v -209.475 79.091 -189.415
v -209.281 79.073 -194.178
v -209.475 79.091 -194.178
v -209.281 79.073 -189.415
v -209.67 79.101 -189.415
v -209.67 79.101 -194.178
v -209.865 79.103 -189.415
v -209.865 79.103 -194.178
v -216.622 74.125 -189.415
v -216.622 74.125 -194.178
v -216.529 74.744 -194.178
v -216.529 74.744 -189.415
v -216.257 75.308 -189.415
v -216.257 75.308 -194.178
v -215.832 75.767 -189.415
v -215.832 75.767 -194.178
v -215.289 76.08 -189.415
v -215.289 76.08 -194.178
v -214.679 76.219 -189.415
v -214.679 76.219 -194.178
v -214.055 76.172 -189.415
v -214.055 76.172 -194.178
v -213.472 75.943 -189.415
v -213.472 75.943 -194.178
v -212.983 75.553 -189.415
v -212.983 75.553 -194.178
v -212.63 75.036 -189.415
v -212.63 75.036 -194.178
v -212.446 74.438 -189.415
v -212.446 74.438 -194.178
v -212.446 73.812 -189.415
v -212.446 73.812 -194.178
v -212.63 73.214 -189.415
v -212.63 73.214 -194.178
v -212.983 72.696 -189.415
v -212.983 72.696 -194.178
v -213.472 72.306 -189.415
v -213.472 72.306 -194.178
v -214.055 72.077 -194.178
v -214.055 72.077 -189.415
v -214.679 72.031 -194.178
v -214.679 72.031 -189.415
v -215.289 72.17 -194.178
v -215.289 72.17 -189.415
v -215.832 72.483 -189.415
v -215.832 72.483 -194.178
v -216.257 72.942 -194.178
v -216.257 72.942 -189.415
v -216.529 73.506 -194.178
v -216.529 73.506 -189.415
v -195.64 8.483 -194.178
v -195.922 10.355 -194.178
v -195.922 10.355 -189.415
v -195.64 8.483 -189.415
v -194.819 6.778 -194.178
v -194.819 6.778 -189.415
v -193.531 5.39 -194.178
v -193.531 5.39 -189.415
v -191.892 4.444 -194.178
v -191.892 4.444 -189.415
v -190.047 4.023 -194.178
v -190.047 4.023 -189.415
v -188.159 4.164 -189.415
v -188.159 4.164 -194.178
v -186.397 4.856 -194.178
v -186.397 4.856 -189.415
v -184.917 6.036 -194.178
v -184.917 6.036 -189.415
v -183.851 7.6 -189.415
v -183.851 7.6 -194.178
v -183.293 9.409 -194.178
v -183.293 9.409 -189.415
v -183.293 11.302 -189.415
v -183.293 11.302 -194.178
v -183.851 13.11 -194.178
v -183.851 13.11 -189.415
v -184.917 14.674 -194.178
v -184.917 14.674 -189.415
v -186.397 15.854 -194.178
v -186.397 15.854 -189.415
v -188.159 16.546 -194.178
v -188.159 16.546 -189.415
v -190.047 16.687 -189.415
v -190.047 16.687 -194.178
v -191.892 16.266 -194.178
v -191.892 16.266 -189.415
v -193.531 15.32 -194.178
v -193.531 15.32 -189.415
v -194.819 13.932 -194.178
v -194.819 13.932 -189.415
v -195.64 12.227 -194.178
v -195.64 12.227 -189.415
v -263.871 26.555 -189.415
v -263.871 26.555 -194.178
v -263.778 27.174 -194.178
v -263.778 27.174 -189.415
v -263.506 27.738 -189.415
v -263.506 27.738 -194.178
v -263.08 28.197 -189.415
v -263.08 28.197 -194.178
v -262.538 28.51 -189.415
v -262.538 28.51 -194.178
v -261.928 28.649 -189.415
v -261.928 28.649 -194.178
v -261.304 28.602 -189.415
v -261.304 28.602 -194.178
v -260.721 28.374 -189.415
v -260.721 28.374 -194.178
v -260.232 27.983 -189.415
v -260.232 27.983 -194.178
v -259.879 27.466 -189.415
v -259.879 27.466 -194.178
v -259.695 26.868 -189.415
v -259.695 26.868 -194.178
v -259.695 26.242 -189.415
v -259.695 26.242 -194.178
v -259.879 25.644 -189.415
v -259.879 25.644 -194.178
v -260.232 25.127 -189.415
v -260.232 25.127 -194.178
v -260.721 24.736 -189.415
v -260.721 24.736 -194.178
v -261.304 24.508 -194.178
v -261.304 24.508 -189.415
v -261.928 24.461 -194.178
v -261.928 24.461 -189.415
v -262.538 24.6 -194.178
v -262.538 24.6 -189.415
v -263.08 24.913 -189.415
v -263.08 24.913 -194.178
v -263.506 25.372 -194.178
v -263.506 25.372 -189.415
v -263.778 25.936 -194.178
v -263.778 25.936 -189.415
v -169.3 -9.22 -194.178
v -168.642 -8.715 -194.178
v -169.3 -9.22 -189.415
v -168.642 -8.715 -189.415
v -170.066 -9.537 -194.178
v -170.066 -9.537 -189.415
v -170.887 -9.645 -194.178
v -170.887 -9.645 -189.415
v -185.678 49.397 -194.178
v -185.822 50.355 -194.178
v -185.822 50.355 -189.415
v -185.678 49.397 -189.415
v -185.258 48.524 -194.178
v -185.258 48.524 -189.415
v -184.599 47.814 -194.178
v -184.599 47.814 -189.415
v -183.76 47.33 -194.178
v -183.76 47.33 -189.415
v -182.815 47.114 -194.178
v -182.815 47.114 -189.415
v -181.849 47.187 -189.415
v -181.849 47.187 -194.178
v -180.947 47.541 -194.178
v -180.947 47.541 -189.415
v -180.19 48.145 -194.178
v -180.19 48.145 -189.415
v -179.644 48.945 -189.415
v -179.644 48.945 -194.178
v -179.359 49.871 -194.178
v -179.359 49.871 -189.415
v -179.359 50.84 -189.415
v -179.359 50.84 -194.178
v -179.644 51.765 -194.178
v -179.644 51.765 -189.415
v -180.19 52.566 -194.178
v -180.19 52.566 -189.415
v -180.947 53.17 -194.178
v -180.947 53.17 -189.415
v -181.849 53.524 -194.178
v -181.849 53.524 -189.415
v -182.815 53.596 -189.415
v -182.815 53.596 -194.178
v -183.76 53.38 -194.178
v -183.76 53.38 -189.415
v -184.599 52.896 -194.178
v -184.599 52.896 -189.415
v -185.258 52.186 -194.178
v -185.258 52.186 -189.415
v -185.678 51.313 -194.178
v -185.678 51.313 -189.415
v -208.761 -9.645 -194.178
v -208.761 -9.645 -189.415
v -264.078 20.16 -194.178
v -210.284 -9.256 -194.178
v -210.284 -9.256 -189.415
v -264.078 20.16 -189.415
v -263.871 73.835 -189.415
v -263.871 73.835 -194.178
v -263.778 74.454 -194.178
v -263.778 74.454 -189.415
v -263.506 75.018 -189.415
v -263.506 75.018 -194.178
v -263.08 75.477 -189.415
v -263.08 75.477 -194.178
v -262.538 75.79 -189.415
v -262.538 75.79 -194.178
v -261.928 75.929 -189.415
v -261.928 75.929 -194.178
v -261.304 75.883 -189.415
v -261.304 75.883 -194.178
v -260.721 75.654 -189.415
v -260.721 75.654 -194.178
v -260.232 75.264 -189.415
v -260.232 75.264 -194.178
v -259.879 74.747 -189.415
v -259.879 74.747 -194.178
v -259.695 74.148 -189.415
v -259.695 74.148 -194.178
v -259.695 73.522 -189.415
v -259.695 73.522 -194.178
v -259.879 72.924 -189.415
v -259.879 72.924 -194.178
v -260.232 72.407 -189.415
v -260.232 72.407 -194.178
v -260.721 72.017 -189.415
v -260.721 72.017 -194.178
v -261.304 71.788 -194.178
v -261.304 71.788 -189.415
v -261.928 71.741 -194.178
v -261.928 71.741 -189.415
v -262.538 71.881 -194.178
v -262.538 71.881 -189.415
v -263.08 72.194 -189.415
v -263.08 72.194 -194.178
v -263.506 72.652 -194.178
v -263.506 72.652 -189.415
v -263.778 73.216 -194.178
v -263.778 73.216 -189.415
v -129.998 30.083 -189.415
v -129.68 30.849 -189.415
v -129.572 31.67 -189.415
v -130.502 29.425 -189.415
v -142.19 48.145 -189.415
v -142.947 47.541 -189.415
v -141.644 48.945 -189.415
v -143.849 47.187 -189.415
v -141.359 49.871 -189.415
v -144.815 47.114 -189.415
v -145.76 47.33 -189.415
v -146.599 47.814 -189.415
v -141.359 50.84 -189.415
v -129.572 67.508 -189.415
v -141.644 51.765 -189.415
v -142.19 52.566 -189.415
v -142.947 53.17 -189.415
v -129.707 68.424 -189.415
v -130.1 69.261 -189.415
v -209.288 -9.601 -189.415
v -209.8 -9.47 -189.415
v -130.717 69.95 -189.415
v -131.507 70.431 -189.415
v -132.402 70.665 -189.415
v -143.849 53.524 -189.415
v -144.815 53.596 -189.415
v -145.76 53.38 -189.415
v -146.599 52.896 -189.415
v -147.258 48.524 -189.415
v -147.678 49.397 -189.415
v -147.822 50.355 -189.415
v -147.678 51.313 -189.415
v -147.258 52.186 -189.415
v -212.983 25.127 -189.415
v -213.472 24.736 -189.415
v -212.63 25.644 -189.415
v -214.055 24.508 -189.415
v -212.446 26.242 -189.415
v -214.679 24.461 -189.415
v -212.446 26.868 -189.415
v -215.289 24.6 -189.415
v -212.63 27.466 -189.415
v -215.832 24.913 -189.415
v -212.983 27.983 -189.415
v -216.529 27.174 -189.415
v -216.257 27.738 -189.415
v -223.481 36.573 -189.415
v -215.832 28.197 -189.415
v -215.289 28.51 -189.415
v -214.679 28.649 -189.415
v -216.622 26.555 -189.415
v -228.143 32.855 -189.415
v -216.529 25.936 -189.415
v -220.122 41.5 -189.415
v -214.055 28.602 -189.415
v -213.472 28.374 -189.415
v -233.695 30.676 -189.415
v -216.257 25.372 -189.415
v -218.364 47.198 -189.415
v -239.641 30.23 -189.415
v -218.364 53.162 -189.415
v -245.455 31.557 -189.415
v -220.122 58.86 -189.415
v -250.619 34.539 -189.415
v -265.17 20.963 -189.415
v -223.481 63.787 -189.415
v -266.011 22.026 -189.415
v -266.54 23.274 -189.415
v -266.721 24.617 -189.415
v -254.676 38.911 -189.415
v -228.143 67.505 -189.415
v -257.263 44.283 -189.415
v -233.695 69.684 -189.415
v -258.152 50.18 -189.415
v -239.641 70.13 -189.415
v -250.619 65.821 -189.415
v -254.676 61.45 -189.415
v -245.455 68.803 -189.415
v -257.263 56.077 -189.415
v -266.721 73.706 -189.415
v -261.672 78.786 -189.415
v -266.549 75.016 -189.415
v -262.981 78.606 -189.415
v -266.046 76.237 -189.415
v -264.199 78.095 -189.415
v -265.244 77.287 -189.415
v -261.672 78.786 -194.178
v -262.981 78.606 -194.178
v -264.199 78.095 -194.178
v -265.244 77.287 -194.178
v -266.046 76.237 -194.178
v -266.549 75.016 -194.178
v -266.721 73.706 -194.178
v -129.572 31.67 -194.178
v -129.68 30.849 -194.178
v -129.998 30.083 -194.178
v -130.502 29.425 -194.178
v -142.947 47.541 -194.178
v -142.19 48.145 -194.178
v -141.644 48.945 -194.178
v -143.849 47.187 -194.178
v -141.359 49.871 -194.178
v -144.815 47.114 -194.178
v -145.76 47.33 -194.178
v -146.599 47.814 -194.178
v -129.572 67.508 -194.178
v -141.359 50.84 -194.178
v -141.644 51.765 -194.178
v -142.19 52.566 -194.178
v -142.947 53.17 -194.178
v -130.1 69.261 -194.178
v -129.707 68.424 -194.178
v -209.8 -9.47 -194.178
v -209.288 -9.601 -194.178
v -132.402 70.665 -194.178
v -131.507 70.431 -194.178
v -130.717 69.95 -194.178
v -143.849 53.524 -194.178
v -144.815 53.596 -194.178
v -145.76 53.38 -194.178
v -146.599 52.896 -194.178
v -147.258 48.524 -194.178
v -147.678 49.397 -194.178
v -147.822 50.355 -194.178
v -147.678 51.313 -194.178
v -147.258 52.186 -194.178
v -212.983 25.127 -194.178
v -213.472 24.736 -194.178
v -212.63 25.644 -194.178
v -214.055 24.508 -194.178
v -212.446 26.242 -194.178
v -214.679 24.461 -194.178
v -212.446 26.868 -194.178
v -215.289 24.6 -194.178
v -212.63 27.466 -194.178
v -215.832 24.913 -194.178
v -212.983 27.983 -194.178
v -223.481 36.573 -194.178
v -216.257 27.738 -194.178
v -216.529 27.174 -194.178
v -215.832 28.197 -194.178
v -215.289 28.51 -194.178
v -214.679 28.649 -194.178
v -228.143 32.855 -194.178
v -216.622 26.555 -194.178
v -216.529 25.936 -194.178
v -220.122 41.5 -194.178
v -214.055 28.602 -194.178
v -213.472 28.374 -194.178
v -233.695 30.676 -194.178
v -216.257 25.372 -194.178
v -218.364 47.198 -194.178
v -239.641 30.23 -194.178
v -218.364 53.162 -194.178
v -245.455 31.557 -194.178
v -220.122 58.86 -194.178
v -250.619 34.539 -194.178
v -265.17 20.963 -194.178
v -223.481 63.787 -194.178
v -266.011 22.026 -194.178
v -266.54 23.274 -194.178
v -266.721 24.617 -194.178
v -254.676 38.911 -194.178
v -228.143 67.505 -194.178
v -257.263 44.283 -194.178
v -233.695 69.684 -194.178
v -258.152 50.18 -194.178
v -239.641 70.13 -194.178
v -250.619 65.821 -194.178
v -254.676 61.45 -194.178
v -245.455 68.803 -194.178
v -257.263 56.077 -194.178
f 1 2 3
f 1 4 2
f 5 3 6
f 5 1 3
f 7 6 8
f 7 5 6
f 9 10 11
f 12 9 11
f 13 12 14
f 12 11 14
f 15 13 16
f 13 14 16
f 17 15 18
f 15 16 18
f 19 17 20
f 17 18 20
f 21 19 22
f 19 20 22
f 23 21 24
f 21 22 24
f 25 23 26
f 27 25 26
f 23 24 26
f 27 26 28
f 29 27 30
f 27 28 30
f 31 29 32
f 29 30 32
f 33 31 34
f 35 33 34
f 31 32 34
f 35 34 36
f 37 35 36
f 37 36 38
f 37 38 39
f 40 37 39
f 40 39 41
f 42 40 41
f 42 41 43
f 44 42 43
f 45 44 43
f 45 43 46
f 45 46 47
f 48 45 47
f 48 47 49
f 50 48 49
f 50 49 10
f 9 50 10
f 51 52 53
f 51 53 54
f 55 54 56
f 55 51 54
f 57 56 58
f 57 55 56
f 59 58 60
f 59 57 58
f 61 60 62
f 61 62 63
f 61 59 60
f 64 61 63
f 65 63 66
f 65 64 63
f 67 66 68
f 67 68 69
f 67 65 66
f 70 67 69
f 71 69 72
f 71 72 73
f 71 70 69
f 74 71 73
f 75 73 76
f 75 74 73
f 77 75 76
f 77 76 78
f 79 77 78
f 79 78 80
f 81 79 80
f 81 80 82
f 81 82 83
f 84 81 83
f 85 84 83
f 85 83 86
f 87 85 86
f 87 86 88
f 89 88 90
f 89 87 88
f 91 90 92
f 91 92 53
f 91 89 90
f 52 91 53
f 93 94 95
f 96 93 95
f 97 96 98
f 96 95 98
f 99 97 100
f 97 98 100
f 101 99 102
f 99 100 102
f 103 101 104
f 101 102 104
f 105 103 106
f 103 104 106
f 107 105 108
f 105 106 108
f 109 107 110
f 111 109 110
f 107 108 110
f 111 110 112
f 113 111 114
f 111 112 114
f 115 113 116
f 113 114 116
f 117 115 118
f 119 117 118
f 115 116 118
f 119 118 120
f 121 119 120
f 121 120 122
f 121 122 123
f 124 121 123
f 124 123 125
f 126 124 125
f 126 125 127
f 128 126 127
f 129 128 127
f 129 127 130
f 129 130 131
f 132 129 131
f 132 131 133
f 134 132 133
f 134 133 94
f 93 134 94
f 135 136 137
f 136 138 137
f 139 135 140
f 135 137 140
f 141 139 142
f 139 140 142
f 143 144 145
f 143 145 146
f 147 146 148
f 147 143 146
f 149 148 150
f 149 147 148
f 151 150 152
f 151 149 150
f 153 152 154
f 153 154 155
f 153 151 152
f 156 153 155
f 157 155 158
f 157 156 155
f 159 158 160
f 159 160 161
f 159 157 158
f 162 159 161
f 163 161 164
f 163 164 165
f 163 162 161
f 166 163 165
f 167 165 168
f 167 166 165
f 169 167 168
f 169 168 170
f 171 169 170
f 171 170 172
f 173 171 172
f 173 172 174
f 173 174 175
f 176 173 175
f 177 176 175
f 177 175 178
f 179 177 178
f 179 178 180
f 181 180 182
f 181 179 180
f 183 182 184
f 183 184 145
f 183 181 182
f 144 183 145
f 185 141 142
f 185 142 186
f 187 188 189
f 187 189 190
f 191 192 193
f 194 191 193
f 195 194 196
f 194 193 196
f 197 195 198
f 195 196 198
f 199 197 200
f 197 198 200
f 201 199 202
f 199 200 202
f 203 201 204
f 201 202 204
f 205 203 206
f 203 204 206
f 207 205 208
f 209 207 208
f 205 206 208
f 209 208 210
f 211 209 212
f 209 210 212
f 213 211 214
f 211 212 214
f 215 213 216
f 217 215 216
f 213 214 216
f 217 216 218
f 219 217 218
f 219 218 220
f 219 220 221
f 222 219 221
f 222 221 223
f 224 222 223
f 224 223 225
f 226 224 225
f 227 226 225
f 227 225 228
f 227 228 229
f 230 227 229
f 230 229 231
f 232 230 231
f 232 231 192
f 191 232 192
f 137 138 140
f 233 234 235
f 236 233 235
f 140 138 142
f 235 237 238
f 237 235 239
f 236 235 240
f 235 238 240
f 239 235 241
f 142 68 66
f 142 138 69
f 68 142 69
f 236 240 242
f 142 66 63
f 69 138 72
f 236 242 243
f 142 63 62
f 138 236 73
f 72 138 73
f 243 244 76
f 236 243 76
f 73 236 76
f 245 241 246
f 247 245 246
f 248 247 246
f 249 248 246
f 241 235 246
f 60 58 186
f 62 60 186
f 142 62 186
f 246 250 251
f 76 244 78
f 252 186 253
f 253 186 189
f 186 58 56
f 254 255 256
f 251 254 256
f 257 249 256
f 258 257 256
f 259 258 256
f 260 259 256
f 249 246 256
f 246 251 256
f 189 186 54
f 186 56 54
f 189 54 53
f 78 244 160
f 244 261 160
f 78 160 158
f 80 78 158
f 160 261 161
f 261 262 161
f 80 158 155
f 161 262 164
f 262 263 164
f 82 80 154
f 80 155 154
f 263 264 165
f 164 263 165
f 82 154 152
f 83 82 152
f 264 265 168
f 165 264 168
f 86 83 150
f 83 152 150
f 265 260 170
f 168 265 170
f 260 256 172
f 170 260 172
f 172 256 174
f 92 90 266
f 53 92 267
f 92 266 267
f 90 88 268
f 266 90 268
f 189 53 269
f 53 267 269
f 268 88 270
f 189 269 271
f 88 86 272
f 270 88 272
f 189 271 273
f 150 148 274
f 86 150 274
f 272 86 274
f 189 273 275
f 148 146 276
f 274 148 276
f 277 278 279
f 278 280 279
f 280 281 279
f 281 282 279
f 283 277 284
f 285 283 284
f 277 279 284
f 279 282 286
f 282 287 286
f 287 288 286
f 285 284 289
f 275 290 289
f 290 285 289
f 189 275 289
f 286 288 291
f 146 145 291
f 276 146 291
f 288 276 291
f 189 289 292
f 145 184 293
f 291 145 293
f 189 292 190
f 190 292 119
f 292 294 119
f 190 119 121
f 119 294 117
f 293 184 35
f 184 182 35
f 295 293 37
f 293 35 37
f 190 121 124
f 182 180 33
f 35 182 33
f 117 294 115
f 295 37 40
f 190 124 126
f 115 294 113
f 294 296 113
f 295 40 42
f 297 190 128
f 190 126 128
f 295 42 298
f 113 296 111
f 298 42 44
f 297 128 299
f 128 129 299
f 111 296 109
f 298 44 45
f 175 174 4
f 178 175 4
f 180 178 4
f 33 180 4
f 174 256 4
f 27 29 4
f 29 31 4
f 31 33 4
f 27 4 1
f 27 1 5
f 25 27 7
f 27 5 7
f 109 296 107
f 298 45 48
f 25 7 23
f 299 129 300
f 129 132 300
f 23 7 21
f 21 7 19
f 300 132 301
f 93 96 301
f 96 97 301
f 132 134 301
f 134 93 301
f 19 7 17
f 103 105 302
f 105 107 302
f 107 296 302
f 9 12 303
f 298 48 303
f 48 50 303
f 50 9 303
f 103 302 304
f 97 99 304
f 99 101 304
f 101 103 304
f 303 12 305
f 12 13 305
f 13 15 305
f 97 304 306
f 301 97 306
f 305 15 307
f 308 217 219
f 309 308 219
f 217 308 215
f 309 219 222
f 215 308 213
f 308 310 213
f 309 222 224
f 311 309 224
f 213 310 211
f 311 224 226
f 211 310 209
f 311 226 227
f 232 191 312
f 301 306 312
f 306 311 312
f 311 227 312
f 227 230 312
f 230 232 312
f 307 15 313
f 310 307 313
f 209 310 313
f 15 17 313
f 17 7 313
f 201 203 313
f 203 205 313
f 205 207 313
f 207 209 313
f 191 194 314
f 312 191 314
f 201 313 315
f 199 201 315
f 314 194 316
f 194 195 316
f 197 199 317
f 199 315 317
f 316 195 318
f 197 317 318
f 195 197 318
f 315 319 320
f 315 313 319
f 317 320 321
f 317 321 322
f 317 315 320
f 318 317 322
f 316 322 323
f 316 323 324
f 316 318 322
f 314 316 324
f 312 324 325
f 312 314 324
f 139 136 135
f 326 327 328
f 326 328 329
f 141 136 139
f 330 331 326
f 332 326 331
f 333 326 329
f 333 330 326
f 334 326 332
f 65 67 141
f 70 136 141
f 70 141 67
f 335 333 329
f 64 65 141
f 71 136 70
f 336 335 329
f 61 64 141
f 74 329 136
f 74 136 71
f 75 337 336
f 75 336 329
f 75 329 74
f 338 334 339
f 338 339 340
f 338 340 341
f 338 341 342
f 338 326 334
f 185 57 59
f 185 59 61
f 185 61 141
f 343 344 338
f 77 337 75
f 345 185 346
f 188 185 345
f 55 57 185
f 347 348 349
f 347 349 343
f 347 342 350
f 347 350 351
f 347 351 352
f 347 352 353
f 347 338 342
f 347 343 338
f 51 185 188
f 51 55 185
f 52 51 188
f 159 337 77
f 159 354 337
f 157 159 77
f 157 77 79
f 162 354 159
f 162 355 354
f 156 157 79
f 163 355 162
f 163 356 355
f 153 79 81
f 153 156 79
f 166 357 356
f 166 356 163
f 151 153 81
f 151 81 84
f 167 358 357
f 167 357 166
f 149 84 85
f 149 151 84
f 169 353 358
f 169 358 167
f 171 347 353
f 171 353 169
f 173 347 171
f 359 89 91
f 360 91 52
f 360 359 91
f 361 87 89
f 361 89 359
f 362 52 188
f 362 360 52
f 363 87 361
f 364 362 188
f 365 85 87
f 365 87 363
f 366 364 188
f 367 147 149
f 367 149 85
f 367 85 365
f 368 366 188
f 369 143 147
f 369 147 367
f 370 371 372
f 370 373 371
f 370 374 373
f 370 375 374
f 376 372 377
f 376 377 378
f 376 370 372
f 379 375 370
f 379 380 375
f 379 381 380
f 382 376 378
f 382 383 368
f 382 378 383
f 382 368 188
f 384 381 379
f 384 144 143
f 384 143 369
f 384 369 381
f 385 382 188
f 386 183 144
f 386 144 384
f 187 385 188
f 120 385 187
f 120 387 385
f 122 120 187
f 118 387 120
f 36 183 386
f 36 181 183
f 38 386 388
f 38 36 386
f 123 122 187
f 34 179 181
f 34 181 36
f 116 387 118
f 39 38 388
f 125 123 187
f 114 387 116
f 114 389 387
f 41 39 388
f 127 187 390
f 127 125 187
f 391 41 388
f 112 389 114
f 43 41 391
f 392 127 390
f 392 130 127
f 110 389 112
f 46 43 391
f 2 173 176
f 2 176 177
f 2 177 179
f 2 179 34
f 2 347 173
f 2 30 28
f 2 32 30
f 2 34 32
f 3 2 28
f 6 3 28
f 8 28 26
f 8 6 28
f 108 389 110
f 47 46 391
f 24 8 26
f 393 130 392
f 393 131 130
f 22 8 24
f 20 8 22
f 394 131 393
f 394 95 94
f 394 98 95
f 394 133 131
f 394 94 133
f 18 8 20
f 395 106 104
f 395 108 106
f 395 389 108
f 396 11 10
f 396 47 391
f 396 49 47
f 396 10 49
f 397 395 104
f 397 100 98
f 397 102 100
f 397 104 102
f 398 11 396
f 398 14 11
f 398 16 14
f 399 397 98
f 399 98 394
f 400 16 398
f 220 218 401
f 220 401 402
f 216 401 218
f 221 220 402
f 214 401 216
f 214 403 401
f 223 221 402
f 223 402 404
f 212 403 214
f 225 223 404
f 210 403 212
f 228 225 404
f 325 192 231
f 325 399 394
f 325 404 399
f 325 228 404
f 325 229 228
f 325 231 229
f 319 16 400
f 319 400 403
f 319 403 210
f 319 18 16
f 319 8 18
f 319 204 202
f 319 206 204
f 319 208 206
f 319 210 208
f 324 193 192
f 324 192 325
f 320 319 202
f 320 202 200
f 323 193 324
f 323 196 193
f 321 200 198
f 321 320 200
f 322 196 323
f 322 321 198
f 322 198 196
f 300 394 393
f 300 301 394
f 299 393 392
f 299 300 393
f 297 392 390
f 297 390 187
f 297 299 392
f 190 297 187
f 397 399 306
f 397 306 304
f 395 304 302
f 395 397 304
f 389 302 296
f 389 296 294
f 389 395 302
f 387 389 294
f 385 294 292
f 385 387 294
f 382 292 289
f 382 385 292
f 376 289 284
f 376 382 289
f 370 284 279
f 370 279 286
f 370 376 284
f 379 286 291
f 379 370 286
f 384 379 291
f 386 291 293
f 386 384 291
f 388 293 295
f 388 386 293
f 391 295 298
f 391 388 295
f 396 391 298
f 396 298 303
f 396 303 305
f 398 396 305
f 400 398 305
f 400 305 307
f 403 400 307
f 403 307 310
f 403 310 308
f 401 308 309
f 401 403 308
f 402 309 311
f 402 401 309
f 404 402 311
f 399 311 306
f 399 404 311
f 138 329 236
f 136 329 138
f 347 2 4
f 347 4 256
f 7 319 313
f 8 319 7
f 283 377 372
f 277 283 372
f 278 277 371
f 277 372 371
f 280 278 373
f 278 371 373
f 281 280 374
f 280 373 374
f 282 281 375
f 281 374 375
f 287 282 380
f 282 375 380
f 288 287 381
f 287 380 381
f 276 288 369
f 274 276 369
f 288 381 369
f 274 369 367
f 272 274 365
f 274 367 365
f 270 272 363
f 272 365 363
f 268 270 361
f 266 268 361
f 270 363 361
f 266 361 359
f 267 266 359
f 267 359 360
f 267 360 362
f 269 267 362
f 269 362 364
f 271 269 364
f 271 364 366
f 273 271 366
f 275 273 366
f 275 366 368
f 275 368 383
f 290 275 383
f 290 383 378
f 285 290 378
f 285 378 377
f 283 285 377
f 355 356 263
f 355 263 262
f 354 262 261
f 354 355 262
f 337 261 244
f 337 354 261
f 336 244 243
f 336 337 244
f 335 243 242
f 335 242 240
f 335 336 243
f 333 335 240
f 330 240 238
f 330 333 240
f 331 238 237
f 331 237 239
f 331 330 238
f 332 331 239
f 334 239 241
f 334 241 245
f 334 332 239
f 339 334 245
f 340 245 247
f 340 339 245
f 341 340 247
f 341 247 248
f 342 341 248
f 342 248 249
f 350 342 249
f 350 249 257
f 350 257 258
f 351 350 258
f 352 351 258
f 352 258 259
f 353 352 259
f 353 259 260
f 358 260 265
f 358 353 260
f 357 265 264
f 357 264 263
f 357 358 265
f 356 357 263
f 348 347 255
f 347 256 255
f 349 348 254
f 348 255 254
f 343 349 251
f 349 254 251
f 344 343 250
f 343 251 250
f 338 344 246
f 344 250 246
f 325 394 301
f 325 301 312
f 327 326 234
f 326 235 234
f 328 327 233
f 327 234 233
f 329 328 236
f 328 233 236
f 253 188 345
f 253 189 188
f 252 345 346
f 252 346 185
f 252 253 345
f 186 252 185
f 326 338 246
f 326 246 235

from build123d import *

# Parameters (mm, degrees)
SKETCH3_R             = 6.350000004
SKETCH3_R_2           = 3.25
SKETCH3_R_3           = 20.005589459
BOSS_EXTRUDE1_DEPTH   = 4.7625
FILLET1_R             = 3.175
FILLET2_R             = 5.08
M5_TAPPED_HOLE1_D     = 4.2
M5_TAPPED_HOLE1_DEPTH = 14
M5_TAPPED_HOLE1_TIP   = 1.2618073


with BuildPart() as part:
    # Sketch3 → Boss-Extrude1 (new body)
    with BuildSketch(Plane.XY.offset(-194.177612449)):
        Polygon((-209.572241428, 79.105126535), (-129.572241428, 70.355126535), (-129.572241428, 30.355126535), (-169.572241428, -9.644873465), (-209.572241428, -9.644873465), (-266.721169677, 21.605126535), (-266.721169677, 78.755126535), align=None)
        with Locations(Location((-189.572241428, 10.355126535, 0), (0, 0, 180))):
            Circle(SKETCH3_R, mode=Mode.SUBTRACT)
        with Locations(Location((-182.572241428, 50.355126535, 0), (0, 0, 180))):
            Circle(SKETCH3_R_2, mode=Mode.SUBTRACT)
        with Locations(Location((-144.572241428, 50.355126535, 0), (0, 0, 180))):
            Circle(SKETCH3_R_2, mode=Mode.SUBTRACT)
        with Locations(Location((-238.146169677, 50.180126535, 0), (0, 0, 180))):
            Circle(SKETCH3_R_3, mode=Mode.SUBTRACT)
    extrude(amount=BOSS_EXTRUDE1_DEPTH)

    # Fillet1
    fillet1_edges = [part.edges().sort_by_distance(p)[0] for p in [
        (-209.572241428, -9.644873465, -191.796362449),
        (-169.572241428, -9.644873465, -191.796362449),
        (-129.572241428, 30.355126535, -191.796362449),
        (-129.572241428, 70.355126535, -191.796362449),
    ]]
    fillet(fillet1_edges, radius=FILLET1_R)

    # Fillet2
    fillet2_edges = [part.edges().sort_by_distance(p)[0] for p in [
        (-266.721169677, 78.755126535, -191.796362449),
        (-266.721169677, 21.605126535, -191.796362449),
        (-209.572241428, 79.105126535, -191.796362449),
    ]]
    fillet(fillet2_edges, radius=FILLET2_R)

    # M5 Tapped Hole1
    with Locations(Plane.XY.offset(-189.415112449)):
        with Locations((-214.522241428, 74.124718176), (-261.771169677, 73.835349234), (-214.522241428, 26.555126535), (-261.771169677, 26.555126535)):
            Hole(M5_TAPPED_HOLE1_D / 2, depth=M5_TAPPED_HOLE1_DEPTH)
            with Locations((0, 0, -(M5_TAPPED_HOLE1_DEPTH + M5_TAPPED_HOLE1_TIP / 2))):  # 118° drill point
                Cone(0, M5_TAPPED_HOLE1_D / 2, M5_TAPPED_HOLE1_TIP, mode=Mode.SUBTRACT)


solid = part.part
